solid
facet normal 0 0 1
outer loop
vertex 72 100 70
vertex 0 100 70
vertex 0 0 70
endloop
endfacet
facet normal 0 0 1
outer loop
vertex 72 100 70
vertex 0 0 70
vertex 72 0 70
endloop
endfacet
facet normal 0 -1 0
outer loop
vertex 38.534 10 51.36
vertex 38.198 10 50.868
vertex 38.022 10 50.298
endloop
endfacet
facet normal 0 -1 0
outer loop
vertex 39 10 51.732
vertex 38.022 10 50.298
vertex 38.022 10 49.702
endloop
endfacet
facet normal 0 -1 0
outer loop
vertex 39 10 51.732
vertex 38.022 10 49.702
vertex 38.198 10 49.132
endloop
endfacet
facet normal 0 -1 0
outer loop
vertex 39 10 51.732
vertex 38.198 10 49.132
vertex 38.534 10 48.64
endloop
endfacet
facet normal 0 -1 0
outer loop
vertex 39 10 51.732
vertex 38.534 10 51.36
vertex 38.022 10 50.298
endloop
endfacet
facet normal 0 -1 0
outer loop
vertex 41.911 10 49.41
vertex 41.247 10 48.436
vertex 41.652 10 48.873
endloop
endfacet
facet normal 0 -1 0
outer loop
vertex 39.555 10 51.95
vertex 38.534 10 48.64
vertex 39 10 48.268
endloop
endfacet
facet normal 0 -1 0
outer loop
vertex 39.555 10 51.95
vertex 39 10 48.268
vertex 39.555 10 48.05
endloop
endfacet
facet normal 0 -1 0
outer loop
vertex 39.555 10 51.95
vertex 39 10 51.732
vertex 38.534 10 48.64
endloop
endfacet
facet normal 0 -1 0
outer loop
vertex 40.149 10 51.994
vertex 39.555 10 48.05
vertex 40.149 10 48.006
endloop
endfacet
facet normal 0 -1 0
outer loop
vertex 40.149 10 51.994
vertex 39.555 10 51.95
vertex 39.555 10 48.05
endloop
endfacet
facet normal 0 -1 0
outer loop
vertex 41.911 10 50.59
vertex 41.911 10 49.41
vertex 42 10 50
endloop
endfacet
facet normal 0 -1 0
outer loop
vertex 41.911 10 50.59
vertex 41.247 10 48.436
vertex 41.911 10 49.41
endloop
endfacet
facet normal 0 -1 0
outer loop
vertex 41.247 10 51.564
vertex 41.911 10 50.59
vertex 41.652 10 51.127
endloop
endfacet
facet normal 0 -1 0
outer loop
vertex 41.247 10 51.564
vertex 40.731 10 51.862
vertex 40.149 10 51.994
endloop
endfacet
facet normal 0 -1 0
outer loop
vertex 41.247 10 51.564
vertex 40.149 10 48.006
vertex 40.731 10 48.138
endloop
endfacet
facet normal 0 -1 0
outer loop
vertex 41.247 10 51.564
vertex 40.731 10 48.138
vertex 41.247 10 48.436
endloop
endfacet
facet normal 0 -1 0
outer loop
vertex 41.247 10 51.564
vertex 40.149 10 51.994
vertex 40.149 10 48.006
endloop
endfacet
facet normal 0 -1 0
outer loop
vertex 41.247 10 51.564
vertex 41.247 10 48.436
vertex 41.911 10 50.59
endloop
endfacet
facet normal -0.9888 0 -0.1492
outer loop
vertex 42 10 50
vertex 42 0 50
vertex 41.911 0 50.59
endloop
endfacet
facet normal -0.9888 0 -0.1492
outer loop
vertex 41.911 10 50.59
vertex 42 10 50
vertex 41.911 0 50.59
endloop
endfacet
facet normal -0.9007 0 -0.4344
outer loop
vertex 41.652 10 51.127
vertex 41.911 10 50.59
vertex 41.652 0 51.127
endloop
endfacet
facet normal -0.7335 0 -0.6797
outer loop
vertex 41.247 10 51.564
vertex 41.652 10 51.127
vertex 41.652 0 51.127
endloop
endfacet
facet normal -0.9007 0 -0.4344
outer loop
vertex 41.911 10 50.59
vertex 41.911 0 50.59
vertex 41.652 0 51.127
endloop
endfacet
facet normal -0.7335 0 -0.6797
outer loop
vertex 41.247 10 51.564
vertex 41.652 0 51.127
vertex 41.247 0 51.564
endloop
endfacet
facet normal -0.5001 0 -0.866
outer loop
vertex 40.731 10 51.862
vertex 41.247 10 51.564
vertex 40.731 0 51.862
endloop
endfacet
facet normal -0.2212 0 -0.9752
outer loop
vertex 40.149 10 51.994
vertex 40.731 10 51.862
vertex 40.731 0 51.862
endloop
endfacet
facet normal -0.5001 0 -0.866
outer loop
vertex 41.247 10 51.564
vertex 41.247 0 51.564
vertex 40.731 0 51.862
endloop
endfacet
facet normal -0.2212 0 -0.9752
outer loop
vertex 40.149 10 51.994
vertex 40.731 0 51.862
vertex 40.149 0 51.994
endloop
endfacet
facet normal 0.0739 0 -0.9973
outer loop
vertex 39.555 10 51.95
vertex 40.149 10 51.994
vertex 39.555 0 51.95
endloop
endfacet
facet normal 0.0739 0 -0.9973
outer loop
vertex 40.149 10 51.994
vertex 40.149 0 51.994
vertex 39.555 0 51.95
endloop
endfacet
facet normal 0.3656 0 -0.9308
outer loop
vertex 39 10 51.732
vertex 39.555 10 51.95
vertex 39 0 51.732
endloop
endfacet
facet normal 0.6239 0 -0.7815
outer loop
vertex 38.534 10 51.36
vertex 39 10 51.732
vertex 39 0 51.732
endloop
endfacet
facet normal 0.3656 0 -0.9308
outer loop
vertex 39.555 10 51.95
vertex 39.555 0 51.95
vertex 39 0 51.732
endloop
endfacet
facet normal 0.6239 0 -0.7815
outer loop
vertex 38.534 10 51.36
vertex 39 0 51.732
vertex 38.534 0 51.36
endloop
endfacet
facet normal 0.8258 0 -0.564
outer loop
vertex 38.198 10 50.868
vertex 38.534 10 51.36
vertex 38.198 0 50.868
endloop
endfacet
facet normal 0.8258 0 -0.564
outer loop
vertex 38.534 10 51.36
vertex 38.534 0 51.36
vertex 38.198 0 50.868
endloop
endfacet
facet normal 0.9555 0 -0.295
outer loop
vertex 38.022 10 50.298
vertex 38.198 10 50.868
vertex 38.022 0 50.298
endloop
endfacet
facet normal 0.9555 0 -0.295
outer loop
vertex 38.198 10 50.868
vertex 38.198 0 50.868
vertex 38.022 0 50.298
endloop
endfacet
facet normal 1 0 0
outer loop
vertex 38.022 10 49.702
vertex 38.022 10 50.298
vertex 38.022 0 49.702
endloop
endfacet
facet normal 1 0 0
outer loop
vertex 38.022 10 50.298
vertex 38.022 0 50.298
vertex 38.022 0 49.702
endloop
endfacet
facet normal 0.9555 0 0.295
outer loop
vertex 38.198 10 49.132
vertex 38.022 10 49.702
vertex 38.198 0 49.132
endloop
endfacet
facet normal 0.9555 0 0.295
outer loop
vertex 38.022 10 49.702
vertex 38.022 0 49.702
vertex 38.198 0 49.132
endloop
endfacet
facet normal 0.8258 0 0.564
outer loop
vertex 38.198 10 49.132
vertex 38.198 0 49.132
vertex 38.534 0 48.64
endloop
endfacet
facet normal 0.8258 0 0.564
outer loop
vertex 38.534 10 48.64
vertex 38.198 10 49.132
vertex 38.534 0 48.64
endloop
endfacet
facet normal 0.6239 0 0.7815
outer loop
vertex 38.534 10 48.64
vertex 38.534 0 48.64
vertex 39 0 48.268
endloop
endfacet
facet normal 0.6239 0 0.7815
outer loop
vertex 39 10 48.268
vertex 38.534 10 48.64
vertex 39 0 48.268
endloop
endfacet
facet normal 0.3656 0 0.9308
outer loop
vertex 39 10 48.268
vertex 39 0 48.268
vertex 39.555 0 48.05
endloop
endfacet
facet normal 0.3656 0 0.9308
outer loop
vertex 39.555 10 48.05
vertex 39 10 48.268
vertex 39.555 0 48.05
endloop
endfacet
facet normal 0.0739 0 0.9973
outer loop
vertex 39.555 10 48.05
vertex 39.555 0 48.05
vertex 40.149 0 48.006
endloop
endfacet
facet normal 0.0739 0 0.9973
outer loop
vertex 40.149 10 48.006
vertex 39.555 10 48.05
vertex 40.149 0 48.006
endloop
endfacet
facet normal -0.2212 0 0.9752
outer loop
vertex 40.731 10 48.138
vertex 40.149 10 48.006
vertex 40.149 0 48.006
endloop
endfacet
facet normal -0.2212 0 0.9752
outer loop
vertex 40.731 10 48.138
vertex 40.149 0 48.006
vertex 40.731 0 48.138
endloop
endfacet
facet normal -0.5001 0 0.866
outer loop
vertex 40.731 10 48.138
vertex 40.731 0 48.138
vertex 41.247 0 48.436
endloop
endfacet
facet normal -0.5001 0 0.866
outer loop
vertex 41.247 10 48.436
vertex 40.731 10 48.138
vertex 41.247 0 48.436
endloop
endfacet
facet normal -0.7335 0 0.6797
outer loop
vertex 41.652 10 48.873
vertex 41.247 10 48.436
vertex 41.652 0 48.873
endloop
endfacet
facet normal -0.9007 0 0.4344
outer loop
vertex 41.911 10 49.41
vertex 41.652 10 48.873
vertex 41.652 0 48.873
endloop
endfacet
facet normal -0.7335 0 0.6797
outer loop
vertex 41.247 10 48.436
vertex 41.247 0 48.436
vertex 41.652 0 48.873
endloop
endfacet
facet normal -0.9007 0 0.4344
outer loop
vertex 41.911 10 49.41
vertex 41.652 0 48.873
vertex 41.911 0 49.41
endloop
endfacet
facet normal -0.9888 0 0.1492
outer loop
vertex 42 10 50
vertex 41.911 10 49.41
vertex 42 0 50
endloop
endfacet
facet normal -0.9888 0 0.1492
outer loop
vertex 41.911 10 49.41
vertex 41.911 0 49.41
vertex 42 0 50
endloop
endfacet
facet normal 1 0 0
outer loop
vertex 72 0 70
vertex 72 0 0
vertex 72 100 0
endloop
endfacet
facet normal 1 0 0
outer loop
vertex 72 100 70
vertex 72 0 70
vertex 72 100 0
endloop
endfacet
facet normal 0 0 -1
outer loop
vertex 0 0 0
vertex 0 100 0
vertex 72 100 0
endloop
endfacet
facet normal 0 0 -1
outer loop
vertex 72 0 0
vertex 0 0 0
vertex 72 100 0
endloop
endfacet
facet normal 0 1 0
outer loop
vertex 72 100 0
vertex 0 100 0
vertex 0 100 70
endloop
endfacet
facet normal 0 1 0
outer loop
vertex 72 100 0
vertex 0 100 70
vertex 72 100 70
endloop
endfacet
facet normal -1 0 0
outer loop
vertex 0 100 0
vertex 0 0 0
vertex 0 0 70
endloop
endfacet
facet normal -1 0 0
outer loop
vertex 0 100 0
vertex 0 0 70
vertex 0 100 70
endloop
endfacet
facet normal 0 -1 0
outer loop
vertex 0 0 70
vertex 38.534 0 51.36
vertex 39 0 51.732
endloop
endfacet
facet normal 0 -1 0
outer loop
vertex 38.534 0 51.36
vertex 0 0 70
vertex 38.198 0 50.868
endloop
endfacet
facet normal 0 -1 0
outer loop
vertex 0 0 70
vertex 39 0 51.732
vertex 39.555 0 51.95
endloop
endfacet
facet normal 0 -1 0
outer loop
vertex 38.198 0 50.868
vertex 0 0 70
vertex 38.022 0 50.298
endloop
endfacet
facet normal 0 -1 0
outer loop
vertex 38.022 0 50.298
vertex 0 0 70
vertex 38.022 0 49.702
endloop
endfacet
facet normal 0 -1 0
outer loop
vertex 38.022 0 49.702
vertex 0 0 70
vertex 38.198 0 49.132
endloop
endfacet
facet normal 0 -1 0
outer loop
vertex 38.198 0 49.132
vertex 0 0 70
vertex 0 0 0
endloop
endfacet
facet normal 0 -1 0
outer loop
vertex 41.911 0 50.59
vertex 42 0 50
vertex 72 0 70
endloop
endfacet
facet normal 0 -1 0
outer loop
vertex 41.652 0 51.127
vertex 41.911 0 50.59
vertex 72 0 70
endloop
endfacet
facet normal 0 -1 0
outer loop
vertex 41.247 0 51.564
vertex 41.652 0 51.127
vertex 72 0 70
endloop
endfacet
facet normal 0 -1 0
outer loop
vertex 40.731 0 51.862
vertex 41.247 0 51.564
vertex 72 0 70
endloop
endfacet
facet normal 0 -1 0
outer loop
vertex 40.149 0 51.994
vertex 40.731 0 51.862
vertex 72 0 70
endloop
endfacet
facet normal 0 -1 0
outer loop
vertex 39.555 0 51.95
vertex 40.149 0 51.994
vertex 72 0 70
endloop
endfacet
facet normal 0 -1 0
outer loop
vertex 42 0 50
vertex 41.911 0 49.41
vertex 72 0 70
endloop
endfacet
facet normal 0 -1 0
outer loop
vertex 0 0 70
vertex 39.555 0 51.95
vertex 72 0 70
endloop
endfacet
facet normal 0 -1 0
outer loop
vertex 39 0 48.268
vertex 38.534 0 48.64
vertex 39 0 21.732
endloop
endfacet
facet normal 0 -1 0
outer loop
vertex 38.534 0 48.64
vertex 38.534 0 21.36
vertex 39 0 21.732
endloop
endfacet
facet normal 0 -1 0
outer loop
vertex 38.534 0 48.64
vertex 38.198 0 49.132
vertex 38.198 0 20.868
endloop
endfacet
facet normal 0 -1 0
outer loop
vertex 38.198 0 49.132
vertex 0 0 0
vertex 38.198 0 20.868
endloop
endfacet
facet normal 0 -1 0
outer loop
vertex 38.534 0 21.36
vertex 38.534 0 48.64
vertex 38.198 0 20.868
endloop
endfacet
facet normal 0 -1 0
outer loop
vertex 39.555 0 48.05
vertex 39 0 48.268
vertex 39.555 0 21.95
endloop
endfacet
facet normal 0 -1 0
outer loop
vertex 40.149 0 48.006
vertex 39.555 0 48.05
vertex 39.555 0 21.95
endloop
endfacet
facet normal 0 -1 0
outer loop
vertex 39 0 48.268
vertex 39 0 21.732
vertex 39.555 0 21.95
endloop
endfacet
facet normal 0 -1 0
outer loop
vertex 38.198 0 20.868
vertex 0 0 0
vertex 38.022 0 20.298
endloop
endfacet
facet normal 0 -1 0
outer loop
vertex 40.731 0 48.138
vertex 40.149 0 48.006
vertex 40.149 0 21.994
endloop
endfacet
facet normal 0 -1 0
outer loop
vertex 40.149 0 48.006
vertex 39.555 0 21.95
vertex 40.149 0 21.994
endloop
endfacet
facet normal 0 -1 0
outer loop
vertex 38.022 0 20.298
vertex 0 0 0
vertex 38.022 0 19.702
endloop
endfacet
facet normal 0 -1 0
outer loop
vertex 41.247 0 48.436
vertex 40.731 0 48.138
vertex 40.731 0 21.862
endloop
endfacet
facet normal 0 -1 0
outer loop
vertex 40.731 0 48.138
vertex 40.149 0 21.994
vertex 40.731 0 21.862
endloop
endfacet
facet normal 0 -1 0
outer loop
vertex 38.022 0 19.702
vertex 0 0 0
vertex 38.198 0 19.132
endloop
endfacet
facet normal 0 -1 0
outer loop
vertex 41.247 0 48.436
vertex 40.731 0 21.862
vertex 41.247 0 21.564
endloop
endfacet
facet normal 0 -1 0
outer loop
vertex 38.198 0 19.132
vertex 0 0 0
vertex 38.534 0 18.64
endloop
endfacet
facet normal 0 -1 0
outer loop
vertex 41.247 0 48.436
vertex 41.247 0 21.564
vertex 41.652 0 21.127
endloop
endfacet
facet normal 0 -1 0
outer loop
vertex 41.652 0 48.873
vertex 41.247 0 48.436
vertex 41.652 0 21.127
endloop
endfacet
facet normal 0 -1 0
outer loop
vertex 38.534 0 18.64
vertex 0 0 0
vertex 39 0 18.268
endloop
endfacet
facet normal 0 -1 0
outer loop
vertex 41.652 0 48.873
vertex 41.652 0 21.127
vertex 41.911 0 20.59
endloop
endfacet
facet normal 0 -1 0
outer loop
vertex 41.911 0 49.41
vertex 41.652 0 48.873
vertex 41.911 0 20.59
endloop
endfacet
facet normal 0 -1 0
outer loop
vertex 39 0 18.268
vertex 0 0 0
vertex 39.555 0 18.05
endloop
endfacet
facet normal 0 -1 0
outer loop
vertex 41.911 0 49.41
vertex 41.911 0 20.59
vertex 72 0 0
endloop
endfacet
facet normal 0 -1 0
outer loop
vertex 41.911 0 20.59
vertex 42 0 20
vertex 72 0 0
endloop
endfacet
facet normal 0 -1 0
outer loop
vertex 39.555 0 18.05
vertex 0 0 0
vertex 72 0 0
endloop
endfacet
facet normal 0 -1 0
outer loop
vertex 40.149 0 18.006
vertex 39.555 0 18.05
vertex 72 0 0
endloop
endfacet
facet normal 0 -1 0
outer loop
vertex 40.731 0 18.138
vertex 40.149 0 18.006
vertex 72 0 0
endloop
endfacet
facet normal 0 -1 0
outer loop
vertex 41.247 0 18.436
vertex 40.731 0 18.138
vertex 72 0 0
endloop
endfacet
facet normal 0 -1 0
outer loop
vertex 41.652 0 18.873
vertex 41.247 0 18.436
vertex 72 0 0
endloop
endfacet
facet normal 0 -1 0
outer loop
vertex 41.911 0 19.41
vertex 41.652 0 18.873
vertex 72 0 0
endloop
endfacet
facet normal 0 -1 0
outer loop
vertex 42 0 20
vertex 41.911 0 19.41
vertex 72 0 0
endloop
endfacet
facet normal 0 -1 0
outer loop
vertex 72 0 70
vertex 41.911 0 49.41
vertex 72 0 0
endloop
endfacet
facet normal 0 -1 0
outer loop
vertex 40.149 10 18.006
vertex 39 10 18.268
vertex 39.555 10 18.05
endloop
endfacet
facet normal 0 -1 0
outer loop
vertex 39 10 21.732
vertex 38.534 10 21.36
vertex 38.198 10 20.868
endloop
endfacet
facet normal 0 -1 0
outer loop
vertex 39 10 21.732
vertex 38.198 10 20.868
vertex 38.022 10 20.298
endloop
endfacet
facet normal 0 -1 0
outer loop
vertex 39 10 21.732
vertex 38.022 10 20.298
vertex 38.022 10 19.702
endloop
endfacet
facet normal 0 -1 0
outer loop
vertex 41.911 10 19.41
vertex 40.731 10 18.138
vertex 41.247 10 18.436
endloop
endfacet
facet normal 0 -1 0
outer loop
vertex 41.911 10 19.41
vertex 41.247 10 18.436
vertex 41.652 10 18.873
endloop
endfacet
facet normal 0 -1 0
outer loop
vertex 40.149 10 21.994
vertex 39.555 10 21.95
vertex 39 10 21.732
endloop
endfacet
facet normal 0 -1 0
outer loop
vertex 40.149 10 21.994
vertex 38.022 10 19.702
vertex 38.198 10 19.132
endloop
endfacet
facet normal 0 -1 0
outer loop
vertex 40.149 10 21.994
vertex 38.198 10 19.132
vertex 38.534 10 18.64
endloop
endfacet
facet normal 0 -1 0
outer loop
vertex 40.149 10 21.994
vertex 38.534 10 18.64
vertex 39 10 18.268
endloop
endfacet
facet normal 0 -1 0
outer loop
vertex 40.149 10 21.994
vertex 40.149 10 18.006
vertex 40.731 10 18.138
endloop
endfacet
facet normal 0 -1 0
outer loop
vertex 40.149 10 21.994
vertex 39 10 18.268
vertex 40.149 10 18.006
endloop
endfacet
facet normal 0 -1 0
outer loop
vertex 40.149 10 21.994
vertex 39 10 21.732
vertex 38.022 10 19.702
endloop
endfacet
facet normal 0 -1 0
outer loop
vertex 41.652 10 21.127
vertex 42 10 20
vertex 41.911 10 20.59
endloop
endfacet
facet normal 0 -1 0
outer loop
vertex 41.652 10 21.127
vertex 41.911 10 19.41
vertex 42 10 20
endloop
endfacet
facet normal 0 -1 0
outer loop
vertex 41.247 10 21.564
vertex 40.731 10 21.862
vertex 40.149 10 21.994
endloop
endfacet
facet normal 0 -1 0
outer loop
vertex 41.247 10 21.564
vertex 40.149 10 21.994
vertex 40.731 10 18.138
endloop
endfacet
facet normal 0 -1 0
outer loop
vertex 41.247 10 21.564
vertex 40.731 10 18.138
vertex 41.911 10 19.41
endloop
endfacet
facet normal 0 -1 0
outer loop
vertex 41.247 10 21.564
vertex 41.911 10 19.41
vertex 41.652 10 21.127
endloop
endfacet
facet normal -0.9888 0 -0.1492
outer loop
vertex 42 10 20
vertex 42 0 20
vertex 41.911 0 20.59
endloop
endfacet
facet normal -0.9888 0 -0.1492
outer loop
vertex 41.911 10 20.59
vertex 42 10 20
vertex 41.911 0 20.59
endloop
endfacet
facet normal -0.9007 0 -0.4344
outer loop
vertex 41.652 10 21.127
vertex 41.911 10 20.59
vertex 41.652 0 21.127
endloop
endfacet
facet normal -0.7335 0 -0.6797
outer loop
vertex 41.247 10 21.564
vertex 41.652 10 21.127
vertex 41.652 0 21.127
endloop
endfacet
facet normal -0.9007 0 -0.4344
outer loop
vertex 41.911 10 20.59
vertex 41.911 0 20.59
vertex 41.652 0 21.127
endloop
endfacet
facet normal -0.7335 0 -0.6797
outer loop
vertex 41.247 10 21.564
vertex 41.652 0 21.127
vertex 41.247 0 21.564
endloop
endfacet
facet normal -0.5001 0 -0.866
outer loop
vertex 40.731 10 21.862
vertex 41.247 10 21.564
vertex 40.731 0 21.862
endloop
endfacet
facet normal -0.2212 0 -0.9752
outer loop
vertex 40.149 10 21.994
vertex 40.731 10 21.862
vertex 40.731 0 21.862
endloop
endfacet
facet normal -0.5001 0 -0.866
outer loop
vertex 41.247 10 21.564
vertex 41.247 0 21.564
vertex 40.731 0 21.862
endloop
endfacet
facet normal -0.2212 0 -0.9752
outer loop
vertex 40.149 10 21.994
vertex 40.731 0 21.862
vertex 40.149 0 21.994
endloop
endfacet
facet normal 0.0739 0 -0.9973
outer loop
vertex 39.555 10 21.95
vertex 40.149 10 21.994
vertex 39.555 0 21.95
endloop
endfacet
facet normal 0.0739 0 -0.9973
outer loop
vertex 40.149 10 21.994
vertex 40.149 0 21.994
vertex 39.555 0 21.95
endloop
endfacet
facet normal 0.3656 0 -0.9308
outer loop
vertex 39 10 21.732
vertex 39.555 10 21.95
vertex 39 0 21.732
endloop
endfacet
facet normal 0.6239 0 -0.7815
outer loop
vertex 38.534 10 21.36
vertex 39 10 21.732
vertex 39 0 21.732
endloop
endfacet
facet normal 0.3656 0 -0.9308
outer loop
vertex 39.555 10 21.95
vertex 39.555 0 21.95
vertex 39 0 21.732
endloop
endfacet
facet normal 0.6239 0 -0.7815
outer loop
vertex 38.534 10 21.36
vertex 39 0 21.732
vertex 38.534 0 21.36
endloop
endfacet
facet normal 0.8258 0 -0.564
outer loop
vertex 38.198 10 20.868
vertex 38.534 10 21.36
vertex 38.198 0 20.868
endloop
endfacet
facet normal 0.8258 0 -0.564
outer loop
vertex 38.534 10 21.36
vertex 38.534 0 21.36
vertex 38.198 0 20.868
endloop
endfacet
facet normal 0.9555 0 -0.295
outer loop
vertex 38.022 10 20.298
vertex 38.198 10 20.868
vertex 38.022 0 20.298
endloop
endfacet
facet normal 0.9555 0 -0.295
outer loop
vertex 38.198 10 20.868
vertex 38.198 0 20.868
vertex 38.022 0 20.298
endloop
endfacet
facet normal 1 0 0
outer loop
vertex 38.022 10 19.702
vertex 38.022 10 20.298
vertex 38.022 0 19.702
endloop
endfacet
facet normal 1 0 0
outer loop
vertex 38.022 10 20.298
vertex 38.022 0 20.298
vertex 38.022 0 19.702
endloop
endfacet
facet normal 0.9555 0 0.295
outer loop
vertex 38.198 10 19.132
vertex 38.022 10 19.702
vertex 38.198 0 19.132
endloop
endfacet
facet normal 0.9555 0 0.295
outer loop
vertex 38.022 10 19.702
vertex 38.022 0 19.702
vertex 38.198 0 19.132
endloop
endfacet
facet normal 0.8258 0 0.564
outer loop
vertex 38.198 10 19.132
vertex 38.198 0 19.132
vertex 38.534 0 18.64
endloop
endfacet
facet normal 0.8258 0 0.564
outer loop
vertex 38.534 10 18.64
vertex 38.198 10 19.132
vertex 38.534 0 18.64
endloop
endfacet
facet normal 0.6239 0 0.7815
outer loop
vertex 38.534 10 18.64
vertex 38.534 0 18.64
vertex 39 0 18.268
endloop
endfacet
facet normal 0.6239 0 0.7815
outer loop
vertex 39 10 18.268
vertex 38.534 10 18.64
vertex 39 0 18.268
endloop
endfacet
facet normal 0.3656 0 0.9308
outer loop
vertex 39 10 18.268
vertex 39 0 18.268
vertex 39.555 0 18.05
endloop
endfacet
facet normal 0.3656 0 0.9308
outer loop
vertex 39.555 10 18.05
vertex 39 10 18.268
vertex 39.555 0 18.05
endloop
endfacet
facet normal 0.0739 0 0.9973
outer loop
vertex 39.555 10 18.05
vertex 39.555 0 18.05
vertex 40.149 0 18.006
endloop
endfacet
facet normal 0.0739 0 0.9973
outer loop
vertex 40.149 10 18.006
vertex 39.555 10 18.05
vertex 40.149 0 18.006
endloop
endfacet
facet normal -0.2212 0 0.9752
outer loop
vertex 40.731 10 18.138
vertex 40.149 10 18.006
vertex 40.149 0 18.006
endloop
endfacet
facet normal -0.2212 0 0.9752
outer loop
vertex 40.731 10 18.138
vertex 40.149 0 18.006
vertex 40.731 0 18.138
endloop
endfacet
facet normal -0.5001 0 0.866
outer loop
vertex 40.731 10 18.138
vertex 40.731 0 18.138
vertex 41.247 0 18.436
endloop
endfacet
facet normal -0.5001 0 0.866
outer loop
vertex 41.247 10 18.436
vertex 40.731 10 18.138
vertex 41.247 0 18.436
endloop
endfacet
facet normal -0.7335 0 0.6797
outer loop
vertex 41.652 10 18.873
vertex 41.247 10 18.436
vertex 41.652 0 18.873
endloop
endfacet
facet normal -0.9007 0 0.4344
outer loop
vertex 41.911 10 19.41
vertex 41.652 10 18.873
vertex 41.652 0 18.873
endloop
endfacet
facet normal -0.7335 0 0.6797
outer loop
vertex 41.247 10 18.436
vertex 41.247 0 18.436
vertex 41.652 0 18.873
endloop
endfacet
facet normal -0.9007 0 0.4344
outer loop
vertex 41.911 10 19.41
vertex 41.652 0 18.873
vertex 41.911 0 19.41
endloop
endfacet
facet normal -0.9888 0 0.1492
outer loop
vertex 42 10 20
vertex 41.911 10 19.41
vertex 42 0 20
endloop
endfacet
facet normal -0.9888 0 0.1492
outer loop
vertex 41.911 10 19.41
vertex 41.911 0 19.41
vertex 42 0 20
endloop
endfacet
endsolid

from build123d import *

# Parameters (mm, degrees)
SKETCH_1_W          = 72
SKETCH_1_H          = 100
EXTRUDE_1_DEPTH     = 70
SKETCH_2_R          = 2
CUT_EXTRUDE_1_DEPTH = 10


with BuildPart() as part:
    # Эскиз1 → Бобышка-Вытянуть1 (new body)
    with BuildSketch(Plane.XY):
        with Locations((36, 50)):
            Rectangle(SKETCH_1_W, SKETCH_1_H)
    extrude(amount=EXTRUDE_1_DEPTH)

    # Эскиз2 → Вырез-Вытянуть1 (cut)
    with BuildSketch(Plane.XZ):
        with Locations((40, 50)):
            Circle(SKETCH_2_R)
        with Locations((40, 20)):
            Circle(SKETCH_2_R)
    extrude(amount=-CUT_EXTRUDE_1_DEPTH, mode=Mode.SUBTRACT)


solid = part.part
